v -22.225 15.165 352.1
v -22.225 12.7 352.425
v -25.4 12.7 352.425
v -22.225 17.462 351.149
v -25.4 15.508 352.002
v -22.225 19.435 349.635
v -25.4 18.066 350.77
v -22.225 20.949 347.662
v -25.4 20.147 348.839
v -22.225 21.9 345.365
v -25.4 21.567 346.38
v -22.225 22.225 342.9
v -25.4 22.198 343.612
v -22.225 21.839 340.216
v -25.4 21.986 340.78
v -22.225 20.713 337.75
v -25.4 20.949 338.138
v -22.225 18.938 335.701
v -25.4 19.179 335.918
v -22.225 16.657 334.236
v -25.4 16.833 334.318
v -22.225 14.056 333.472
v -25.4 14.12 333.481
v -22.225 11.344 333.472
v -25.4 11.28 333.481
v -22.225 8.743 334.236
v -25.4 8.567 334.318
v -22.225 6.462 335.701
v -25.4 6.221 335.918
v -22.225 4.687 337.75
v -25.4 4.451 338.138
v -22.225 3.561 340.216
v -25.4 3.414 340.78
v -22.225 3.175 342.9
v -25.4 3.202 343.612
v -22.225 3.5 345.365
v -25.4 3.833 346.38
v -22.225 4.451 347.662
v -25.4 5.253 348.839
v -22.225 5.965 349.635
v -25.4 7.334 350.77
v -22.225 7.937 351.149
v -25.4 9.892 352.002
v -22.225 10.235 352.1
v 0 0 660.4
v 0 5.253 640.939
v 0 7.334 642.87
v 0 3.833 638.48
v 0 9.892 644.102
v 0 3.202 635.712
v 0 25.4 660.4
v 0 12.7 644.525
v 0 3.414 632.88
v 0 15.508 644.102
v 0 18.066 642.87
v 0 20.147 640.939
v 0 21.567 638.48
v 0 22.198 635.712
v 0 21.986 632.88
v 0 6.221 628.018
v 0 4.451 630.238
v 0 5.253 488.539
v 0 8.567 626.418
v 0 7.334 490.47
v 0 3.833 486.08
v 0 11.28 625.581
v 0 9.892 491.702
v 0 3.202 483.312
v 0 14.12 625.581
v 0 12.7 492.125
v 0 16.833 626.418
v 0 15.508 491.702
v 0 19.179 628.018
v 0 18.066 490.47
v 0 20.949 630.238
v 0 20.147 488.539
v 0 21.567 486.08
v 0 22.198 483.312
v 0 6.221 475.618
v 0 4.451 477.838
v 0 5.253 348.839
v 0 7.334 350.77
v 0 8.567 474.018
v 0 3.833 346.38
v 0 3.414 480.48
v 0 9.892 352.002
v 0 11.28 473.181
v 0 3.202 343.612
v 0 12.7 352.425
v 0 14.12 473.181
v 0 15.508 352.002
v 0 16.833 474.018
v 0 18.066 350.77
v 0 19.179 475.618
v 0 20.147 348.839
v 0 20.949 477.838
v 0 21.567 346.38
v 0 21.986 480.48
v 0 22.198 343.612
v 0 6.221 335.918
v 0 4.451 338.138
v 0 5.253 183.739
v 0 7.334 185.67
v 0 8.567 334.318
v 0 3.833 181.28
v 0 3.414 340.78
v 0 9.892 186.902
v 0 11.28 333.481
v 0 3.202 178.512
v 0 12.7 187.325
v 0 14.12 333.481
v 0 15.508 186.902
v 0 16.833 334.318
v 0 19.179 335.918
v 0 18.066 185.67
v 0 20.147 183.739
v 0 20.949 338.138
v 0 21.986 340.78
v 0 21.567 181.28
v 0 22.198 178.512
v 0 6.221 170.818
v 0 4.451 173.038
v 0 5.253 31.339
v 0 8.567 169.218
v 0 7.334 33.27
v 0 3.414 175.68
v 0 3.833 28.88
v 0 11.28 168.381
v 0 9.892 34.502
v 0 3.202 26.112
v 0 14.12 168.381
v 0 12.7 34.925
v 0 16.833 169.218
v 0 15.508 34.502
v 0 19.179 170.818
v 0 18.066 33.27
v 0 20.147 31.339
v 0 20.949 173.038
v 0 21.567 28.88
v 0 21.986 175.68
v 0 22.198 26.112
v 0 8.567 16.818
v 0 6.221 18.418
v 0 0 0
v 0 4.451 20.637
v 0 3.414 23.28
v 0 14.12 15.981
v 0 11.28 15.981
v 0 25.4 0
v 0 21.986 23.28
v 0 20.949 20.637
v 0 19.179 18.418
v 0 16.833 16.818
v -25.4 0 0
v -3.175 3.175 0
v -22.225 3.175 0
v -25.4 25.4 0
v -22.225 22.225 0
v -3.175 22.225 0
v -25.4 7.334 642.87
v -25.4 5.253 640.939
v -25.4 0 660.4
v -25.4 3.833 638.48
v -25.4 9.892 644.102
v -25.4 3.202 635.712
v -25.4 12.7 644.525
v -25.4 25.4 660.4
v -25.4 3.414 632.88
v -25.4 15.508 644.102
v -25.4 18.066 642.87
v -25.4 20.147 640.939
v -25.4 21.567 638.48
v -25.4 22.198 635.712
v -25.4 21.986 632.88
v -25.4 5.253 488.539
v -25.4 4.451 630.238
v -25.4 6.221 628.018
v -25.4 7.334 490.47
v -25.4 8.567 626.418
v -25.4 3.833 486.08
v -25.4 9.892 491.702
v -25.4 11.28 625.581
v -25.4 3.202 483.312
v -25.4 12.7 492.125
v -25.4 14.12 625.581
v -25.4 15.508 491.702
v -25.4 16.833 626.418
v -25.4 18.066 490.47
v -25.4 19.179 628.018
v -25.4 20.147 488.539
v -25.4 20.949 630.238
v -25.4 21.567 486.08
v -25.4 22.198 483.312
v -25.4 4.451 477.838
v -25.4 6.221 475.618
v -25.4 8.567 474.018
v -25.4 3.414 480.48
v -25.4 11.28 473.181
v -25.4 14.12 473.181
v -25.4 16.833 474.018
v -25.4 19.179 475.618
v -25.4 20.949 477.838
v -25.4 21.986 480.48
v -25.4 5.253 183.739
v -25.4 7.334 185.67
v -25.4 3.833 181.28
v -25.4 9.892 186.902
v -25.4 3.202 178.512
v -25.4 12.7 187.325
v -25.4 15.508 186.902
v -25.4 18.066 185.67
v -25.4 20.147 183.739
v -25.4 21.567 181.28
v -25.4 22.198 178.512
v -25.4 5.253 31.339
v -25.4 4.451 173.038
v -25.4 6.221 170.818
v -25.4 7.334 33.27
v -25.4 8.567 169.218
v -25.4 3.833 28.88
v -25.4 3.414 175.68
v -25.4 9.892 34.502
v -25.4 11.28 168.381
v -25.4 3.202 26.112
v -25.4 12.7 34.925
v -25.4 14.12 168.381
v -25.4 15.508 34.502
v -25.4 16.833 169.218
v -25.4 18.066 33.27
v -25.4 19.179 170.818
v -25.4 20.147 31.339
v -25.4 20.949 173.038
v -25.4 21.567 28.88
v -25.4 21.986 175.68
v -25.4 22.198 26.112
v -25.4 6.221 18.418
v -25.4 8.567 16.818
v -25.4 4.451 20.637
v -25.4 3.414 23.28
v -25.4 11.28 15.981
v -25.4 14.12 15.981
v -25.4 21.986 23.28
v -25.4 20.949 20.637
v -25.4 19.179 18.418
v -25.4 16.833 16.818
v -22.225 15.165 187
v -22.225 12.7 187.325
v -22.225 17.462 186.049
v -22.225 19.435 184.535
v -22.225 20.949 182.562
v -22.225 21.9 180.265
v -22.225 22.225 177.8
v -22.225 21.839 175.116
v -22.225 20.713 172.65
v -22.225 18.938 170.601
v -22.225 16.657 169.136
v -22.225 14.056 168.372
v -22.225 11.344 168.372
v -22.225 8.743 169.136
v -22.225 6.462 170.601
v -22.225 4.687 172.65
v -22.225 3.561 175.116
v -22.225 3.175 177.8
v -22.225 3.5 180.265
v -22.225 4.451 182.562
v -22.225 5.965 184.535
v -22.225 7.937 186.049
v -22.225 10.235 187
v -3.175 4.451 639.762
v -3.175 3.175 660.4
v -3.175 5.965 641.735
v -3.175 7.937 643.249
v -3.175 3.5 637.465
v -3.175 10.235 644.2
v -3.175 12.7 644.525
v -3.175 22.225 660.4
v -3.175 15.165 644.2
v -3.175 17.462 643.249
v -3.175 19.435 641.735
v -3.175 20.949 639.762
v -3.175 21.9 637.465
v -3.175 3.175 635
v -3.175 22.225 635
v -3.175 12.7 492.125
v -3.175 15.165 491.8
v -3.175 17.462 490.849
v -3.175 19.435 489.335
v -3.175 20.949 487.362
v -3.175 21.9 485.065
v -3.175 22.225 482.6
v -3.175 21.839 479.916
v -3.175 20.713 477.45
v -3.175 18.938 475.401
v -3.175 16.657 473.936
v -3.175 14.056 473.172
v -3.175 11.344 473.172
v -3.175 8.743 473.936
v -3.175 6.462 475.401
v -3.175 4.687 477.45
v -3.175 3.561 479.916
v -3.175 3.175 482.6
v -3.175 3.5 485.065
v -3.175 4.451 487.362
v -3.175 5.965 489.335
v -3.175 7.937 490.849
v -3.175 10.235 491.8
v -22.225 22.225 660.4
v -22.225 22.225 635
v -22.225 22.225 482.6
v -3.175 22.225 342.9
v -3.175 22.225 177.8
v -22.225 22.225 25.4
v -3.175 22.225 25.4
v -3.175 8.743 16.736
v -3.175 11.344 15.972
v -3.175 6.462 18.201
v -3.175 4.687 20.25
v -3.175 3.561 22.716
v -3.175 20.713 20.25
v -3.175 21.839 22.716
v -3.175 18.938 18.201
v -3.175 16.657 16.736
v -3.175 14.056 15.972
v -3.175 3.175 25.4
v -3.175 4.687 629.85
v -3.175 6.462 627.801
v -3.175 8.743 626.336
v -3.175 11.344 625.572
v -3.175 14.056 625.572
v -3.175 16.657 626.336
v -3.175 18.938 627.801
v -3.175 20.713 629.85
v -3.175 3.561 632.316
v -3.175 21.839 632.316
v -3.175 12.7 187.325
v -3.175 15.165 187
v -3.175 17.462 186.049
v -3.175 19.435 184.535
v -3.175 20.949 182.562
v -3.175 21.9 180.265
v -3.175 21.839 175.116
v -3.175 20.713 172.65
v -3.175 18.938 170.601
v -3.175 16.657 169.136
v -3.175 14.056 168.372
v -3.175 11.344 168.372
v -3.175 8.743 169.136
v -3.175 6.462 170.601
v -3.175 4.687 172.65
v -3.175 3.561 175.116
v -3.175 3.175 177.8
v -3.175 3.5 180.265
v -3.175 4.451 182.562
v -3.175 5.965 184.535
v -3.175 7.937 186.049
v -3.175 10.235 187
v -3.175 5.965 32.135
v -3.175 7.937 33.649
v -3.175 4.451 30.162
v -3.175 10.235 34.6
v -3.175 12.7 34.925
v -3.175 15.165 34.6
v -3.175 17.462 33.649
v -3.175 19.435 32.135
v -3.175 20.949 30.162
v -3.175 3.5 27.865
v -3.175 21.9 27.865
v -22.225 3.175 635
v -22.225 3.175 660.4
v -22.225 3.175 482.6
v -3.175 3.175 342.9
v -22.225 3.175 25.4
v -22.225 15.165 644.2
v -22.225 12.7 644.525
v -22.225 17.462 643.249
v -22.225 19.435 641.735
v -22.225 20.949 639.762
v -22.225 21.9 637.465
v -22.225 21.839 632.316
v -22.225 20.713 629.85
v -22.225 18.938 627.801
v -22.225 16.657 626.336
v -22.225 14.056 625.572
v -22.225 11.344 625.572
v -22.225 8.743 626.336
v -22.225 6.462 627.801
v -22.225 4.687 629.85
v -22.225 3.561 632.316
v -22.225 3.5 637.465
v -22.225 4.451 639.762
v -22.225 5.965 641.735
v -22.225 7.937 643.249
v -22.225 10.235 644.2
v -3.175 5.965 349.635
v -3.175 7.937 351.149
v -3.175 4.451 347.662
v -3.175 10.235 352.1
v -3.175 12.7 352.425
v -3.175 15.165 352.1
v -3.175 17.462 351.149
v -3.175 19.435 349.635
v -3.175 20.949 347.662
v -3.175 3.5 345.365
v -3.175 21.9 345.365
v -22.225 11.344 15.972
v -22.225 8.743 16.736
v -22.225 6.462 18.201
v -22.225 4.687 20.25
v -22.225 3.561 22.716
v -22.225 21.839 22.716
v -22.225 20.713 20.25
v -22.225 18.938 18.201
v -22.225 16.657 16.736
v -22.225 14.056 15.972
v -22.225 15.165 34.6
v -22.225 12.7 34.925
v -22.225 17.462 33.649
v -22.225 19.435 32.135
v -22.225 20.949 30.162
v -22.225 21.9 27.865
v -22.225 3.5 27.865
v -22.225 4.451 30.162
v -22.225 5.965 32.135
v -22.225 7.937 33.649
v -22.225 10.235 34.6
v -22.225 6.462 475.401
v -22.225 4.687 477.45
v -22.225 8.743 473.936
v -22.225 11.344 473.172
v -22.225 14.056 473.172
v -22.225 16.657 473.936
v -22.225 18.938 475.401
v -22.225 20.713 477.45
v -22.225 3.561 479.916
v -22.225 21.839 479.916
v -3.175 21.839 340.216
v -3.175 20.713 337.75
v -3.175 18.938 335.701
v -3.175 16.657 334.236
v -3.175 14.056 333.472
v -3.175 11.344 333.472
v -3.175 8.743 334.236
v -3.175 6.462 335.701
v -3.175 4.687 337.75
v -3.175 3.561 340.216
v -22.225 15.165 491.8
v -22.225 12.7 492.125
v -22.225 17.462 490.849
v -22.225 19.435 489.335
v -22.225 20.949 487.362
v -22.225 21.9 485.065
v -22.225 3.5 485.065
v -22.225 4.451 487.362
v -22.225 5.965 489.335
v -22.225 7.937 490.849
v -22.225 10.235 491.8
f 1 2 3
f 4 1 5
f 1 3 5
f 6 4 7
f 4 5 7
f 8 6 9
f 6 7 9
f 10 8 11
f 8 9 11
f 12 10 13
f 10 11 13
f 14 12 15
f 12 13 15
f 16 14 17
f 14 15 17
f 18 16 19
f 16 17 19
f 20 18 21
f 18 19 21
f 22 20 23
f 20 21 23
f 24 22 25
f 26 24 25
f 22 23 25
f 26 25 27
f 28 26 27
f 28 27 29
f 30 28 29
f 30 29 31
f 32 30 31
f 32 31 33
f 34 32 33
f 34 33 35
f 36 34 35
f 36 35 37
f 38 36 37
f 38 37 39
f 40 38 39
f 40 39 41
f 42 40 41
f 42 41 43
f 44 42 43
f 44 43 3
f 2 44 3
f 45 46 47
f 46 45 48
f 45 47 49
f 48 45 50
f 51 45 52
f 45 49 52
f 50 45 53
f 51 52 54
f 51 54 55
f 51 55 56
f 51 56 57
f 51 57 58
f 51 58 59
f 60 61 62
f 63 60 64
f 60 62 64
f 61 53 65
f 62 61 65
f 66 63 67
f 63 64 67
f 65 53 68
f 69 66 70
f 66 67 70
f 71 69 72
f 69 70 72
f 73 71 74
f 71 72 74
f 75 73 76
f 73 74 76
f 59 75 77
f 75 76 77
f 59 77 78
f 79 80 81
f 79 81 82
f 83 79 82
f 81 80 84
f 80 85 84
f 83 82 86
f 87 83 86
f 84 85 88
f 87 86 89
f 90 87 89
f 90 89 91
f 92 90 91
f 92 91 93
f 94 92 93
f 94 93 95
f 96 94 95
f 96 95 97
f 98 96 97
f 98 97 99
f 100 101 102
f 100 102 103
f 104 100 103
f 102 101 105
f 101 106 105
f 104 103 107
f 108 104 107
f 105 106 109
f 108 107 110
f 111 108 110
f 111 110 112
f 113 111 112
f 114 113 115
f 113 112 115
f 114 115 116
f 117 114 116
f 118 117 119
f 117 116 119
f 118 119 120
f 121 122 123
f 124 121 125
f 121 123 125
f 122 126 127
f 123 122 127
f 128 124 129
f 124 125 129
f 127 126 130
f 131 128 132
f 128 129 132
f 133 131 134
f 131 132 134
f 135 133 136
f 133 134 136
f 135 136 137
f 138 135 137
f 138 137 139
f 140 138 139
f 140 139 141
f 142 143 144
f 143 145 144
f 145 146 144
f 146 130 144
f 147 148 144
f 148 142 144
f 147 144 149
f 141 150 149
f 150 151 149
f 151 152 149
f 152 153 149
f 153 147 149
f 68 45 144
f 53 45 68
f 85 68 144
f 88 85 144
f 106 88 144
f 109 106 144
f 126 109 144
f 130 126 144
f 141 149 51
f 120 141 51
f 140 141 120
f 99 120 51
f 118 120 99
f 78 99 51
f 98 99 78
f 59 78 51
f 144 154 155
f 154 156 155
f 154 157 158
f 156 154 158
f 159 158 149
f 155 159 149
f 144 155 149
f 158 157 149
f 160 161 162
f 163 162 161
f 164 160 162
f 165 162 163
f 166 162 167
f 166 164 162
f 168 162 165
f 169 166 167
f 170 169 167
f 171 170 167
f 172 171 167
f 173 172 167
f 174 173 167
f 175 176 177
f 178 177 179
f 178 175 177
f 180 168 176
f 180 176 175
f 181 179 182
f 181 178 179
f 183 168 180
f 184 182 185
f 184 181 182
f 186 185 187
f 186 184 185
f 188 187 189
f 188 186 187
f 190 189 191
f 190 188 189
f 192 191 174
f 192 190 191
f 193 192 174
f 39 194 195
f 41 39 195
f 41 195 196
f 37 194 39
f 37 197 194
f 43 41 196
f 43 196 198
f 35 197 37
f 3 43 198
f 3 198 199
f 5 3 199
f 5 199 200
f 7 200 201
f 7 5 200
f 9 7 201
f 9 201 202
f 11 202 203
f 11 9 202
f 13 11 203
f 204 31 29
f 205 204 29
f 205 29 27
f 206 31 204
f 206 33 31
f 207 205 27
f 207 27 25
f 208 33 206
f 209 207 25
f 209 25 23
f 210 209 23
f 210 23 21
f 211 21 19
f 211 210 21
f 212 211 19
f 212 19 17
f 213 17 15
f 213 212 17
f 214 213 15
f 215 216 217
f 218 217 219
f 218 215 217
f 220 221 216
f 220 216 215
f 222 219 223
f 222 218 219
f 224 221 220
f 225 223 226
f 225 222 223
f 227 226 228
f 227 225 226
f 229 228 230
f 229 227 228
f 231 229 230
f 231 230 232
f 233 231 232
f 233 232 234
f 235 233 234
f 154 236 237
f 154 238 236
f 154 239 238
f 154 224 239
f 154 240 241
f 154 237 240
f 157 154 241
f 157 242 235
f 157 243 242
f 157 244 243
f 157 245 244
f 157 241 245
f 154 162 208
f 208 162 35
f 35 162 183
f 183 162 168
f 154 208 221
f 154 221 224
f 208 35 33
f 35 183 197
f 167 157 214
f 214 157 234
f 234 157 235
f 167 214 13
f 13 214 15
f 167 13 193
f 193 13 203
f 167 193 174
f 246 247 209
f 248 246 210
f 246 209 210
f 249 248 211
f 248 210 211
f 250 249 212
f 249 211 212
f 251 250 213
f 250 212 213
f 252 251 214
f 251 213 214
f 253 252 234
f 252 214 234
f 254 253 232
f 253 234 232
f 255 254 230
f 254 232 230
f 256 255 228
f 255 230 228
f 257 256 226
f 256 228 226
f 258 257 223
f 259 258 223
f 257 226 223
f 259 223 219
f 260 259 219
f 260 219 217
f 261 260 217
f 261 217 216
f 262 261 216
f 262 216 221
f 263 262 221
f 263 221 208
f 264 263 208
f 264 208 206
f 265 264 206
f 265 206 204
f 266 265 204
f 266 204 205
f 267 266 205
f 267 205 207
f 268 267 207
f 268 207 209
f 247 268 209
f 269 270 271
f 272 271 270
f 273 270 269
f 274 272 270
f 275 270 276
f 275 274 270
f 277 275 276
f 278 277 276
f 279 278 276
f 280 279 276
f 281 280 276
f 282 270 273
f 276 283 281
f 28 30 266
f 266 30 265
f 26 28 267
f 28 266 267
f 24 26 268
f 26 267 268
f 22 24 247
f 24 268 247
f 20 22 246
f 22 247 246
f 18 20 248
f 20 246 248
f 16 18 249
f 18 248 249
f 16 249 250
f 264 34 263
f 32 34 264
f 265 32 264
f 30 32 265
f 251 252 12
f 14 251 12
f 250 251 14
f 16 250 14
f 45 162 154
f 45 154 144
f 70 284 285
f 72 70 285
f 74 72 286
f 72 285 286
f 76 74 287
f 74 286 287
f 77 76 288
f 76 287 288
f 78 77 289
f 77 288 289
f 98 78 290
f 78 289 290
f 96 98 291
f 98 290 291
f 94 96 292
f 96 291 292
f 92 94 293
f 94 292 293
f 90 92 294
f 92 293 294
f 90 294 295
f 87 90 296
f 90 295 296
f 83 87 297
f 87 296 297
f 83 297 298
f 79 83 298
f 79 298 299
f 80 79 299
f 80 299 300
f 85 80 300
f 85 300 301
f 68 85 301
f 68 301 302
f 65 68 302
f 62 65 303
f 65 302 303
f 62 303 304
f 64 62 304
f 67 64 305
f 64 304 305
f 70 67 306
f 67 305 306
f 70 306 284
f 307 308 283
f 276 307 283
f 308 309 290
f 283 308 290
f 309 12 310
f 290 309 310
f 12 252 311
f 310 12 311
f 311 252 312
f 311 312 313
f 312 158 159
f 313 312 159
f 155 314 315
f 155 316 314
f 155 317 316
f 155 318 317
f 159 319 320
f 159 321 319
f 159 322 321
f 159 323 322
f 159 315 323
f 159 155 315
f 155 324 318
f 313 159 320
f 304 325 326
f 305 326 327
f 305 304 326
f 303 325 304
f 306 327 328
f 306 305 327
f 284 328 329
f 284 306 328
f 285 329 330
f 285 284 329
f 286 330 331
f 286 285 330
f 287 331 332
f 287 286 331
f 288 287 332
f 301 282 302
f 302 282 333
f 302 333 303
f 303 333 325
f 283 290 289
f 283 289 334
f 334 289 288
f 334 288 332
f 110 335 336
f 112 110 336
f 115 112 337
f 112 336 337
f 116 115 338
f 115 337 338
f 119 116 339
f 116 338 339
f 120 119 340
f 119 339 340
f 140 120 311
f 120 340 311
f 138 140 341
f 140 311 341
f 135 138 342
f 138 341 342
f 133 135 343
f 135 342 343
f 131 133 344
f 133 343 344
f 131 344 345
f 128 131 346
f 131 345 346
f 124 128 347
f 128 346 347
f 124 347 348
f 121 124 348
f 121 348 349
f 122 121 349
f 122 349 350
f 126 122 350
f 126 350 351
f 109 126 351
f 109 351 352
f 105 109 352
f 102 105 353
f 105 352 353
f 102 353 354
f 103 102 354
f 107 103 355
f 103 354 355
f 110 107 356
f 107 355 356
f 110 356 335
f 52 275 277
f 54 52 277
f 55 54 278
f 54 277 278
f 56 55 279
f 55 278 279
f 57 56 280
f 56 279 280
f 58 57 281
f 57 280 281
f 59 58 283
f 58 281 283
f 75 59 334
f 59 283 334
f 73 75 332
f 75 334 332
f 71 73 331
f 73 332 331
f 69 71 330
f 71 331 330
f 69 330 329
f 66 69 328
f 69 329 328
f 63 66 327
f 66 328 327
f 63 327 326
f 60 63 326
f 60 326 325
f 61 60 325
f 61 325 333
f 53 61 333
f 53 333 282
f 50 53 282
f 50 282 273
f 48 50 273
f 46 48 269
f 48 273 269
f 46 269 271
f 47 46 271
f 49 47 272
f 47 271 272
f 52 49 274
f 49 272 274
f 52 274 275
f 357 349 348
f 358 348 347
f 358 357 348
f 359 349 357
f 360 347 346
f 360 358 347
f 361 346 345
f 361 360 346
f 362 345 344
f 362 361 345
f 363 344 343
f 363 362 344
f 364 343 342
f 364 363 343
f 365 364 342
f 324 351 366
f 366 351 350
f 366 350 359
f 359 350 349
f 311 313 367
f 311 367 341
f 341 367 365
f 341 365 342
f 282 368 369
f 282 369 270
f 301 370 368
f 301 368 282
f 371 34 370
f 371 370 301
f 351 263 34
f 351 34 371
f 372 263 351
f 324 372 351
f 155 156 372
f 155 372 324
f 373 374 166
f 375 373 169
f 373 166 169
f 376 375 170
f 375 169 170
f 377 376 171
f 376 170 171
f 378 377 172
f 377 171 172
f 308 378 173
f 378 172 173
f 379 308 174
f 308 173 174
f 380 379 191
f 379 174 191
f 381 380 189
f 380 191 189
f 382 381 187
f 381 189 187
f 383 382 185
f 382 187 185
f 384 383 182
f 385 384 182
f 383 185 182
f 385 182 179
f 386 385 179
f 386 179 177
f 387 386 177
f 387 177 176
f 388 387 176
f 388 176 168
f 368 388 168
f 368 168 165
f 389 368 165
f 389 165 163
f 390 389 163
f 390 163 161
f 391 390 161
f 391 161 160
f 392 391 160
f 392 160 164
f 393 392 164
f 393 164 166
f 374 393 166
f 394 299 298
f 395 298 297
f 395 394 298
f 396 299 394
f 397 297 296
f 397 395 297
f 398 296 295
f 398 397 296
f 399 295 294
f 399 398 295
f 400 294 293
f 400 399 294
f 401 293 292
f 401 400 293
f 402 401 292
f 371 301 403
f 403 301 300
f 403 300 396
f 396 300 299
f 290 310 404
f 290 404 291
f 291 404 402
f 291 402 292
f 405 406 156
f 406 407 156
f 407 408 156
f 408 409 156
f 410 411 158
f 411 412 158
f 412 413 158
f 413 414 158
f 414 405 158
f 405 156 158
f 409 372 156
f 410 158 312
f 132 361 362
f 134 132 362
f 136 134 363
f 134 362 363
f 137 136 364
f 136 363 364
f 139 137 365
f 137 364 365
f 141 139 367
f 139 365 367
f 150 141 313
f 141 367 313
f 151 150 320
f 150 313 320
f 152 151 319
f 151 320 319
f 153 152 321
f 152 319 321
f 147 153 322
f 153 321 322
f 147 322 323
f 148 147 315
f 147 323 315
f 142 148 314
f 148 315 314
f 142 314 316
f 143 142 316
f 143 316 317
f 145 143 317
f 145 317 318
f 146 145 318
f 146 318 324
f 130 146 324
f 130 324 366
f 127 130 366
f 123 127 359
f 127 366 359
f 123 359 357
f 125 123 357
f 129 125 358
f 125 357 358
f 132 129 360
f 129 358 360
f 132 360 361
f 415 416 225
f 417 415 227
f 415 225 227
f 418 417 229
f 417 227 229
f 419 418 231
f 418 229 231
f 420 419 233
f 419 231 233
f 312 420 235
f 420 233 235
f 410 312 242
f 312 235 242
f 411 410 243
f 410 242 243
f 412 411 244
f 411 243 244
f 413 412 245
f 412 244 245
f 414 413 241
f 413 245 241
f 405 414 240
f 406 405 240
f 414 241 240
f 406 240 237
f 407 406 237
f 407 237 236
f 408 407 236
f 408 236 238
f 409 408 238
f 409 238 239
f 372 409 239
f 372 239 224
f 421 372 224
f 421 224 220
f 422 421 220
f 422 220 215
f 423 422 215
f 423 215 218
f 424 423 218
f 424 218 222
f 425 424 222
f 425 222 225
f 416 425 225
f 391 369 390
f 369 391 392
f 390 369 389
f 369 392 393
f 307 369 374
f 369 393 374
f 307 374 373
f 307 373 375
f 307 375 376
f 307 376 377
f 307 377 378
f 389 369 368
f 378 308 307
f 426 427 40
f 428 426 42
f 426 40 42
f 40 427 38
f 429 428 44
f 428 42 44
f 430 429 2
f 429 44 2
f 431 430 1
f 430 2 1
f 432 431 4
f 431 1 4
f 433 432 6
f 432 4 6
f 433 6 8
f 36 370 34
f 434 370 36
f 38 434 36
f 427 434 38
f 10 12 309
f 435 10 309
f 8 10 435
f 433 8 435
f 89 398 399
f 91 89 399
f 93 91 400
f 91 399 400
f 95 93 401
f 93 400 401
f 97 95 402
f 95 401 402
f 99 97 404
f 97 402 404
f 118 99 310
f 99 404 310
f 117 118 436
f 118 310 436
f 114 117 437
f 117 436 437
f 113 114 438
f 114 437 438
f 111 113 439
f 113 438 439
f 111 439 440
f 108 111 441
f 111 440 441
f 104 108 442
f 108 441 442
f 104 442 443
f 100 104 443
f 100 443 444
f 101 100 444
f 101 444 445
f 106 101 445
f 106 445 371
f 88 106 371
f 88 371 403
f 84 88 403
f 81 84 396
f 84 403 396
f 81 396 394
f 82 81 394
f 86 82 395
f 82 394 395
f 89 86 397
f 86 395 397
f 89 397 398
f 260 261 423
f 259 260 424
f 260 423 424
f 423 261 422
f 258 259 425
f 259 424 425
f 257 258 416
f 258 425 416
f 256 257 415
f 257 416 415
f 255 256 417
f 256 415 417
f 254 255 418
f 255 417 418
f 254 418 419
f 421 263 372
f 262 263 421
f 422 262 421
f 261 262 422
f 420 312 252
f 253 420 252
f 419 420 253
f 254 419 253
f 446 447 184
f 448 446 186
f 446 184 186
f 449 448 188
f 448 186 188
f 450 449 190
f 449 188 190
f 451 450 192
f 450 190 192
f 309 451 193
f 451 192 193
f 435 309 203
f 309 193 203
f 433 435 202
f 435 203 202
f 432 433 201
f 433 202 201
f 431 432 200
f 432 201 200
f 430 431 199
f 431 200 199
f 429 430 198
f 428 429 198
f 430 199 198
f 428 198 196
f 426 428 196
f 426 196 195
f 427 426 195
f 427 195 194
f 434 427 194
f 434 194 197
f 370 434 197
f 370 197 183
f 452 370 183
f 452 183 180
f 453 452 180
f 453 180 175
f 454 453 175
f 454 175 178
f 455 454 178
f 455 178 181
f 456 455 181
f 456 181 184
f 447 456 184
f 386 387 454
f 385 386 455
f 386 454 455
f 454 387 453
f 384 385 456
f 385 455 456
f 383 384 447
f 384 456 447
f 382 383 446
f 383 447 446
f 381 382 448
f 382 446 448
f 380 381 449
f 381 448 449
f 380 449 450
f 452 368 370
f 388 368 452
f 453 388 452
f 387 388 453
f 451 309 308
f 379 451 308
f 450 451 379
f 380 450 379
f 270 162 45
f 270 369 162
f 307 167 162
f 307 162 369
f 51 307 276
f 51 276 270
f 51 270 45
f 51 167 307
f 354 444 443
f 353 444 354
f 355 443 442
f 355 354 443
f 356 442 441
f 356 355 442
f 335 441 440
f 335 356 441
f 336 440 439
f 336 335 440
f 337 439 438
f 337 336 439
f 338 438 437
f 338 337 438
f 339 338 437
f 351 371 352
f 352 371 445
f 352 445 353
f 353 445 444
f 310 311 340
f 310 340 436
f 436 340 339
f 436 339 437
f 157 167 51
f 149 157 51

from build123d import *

# Parameters (mm, degrees)
SKETCH1_W           = 25.4
SKETCH1_H           = 25.4
SKETCH1_W_2         = 19.05
SKETCH1_H_2         = 19.05
EXTRUDE_THIN1_DEPTH = 660.4
SKETCH2_R           = 9.525
CUT_EXTRUDE1_DEPTH  = 662.376201568


with BuildPart() as part:
    # Sketch1 → Extrude-Thin1 (new body)
    with BuildSketch(Plane.XY):
        with Locations((-12.7, 12.7)):
            Rectangle(SKETCH1_W, SKETCH1_H)
        with Locations((-12.7, 12.7)):
            Rectangle(SKETCH1_W_2, SKETCH1_H_2, mode=Mode.SUBTRACT)
    extrude(amount=EXTRUDE_THIN1_DEPTH)

    # Sketch2 → Cut-Extrude1 (cut, through all)
    with BuildSketch(Plane.ZY.offset(25.4)):
        with Locations((25.4, 12.7)):
            Circle(SKETCH2_R)
        with Locations((177.8, 12.7)):
            Circle(SKETCH2_R)
        with Locations((482.6, 12.7)):
            Circle(SKETCH2_R)
        with Locations((635, 12.7)):
            Circle(SKETCH2_R)
        with Locations((342.9, 12.7)):
            Circle(SKETCH2_R)
    extrude(amount=-CUT_EXTRUDE1_DEPTH, mode=Mode.SUBTRACT)


solid = part.part
